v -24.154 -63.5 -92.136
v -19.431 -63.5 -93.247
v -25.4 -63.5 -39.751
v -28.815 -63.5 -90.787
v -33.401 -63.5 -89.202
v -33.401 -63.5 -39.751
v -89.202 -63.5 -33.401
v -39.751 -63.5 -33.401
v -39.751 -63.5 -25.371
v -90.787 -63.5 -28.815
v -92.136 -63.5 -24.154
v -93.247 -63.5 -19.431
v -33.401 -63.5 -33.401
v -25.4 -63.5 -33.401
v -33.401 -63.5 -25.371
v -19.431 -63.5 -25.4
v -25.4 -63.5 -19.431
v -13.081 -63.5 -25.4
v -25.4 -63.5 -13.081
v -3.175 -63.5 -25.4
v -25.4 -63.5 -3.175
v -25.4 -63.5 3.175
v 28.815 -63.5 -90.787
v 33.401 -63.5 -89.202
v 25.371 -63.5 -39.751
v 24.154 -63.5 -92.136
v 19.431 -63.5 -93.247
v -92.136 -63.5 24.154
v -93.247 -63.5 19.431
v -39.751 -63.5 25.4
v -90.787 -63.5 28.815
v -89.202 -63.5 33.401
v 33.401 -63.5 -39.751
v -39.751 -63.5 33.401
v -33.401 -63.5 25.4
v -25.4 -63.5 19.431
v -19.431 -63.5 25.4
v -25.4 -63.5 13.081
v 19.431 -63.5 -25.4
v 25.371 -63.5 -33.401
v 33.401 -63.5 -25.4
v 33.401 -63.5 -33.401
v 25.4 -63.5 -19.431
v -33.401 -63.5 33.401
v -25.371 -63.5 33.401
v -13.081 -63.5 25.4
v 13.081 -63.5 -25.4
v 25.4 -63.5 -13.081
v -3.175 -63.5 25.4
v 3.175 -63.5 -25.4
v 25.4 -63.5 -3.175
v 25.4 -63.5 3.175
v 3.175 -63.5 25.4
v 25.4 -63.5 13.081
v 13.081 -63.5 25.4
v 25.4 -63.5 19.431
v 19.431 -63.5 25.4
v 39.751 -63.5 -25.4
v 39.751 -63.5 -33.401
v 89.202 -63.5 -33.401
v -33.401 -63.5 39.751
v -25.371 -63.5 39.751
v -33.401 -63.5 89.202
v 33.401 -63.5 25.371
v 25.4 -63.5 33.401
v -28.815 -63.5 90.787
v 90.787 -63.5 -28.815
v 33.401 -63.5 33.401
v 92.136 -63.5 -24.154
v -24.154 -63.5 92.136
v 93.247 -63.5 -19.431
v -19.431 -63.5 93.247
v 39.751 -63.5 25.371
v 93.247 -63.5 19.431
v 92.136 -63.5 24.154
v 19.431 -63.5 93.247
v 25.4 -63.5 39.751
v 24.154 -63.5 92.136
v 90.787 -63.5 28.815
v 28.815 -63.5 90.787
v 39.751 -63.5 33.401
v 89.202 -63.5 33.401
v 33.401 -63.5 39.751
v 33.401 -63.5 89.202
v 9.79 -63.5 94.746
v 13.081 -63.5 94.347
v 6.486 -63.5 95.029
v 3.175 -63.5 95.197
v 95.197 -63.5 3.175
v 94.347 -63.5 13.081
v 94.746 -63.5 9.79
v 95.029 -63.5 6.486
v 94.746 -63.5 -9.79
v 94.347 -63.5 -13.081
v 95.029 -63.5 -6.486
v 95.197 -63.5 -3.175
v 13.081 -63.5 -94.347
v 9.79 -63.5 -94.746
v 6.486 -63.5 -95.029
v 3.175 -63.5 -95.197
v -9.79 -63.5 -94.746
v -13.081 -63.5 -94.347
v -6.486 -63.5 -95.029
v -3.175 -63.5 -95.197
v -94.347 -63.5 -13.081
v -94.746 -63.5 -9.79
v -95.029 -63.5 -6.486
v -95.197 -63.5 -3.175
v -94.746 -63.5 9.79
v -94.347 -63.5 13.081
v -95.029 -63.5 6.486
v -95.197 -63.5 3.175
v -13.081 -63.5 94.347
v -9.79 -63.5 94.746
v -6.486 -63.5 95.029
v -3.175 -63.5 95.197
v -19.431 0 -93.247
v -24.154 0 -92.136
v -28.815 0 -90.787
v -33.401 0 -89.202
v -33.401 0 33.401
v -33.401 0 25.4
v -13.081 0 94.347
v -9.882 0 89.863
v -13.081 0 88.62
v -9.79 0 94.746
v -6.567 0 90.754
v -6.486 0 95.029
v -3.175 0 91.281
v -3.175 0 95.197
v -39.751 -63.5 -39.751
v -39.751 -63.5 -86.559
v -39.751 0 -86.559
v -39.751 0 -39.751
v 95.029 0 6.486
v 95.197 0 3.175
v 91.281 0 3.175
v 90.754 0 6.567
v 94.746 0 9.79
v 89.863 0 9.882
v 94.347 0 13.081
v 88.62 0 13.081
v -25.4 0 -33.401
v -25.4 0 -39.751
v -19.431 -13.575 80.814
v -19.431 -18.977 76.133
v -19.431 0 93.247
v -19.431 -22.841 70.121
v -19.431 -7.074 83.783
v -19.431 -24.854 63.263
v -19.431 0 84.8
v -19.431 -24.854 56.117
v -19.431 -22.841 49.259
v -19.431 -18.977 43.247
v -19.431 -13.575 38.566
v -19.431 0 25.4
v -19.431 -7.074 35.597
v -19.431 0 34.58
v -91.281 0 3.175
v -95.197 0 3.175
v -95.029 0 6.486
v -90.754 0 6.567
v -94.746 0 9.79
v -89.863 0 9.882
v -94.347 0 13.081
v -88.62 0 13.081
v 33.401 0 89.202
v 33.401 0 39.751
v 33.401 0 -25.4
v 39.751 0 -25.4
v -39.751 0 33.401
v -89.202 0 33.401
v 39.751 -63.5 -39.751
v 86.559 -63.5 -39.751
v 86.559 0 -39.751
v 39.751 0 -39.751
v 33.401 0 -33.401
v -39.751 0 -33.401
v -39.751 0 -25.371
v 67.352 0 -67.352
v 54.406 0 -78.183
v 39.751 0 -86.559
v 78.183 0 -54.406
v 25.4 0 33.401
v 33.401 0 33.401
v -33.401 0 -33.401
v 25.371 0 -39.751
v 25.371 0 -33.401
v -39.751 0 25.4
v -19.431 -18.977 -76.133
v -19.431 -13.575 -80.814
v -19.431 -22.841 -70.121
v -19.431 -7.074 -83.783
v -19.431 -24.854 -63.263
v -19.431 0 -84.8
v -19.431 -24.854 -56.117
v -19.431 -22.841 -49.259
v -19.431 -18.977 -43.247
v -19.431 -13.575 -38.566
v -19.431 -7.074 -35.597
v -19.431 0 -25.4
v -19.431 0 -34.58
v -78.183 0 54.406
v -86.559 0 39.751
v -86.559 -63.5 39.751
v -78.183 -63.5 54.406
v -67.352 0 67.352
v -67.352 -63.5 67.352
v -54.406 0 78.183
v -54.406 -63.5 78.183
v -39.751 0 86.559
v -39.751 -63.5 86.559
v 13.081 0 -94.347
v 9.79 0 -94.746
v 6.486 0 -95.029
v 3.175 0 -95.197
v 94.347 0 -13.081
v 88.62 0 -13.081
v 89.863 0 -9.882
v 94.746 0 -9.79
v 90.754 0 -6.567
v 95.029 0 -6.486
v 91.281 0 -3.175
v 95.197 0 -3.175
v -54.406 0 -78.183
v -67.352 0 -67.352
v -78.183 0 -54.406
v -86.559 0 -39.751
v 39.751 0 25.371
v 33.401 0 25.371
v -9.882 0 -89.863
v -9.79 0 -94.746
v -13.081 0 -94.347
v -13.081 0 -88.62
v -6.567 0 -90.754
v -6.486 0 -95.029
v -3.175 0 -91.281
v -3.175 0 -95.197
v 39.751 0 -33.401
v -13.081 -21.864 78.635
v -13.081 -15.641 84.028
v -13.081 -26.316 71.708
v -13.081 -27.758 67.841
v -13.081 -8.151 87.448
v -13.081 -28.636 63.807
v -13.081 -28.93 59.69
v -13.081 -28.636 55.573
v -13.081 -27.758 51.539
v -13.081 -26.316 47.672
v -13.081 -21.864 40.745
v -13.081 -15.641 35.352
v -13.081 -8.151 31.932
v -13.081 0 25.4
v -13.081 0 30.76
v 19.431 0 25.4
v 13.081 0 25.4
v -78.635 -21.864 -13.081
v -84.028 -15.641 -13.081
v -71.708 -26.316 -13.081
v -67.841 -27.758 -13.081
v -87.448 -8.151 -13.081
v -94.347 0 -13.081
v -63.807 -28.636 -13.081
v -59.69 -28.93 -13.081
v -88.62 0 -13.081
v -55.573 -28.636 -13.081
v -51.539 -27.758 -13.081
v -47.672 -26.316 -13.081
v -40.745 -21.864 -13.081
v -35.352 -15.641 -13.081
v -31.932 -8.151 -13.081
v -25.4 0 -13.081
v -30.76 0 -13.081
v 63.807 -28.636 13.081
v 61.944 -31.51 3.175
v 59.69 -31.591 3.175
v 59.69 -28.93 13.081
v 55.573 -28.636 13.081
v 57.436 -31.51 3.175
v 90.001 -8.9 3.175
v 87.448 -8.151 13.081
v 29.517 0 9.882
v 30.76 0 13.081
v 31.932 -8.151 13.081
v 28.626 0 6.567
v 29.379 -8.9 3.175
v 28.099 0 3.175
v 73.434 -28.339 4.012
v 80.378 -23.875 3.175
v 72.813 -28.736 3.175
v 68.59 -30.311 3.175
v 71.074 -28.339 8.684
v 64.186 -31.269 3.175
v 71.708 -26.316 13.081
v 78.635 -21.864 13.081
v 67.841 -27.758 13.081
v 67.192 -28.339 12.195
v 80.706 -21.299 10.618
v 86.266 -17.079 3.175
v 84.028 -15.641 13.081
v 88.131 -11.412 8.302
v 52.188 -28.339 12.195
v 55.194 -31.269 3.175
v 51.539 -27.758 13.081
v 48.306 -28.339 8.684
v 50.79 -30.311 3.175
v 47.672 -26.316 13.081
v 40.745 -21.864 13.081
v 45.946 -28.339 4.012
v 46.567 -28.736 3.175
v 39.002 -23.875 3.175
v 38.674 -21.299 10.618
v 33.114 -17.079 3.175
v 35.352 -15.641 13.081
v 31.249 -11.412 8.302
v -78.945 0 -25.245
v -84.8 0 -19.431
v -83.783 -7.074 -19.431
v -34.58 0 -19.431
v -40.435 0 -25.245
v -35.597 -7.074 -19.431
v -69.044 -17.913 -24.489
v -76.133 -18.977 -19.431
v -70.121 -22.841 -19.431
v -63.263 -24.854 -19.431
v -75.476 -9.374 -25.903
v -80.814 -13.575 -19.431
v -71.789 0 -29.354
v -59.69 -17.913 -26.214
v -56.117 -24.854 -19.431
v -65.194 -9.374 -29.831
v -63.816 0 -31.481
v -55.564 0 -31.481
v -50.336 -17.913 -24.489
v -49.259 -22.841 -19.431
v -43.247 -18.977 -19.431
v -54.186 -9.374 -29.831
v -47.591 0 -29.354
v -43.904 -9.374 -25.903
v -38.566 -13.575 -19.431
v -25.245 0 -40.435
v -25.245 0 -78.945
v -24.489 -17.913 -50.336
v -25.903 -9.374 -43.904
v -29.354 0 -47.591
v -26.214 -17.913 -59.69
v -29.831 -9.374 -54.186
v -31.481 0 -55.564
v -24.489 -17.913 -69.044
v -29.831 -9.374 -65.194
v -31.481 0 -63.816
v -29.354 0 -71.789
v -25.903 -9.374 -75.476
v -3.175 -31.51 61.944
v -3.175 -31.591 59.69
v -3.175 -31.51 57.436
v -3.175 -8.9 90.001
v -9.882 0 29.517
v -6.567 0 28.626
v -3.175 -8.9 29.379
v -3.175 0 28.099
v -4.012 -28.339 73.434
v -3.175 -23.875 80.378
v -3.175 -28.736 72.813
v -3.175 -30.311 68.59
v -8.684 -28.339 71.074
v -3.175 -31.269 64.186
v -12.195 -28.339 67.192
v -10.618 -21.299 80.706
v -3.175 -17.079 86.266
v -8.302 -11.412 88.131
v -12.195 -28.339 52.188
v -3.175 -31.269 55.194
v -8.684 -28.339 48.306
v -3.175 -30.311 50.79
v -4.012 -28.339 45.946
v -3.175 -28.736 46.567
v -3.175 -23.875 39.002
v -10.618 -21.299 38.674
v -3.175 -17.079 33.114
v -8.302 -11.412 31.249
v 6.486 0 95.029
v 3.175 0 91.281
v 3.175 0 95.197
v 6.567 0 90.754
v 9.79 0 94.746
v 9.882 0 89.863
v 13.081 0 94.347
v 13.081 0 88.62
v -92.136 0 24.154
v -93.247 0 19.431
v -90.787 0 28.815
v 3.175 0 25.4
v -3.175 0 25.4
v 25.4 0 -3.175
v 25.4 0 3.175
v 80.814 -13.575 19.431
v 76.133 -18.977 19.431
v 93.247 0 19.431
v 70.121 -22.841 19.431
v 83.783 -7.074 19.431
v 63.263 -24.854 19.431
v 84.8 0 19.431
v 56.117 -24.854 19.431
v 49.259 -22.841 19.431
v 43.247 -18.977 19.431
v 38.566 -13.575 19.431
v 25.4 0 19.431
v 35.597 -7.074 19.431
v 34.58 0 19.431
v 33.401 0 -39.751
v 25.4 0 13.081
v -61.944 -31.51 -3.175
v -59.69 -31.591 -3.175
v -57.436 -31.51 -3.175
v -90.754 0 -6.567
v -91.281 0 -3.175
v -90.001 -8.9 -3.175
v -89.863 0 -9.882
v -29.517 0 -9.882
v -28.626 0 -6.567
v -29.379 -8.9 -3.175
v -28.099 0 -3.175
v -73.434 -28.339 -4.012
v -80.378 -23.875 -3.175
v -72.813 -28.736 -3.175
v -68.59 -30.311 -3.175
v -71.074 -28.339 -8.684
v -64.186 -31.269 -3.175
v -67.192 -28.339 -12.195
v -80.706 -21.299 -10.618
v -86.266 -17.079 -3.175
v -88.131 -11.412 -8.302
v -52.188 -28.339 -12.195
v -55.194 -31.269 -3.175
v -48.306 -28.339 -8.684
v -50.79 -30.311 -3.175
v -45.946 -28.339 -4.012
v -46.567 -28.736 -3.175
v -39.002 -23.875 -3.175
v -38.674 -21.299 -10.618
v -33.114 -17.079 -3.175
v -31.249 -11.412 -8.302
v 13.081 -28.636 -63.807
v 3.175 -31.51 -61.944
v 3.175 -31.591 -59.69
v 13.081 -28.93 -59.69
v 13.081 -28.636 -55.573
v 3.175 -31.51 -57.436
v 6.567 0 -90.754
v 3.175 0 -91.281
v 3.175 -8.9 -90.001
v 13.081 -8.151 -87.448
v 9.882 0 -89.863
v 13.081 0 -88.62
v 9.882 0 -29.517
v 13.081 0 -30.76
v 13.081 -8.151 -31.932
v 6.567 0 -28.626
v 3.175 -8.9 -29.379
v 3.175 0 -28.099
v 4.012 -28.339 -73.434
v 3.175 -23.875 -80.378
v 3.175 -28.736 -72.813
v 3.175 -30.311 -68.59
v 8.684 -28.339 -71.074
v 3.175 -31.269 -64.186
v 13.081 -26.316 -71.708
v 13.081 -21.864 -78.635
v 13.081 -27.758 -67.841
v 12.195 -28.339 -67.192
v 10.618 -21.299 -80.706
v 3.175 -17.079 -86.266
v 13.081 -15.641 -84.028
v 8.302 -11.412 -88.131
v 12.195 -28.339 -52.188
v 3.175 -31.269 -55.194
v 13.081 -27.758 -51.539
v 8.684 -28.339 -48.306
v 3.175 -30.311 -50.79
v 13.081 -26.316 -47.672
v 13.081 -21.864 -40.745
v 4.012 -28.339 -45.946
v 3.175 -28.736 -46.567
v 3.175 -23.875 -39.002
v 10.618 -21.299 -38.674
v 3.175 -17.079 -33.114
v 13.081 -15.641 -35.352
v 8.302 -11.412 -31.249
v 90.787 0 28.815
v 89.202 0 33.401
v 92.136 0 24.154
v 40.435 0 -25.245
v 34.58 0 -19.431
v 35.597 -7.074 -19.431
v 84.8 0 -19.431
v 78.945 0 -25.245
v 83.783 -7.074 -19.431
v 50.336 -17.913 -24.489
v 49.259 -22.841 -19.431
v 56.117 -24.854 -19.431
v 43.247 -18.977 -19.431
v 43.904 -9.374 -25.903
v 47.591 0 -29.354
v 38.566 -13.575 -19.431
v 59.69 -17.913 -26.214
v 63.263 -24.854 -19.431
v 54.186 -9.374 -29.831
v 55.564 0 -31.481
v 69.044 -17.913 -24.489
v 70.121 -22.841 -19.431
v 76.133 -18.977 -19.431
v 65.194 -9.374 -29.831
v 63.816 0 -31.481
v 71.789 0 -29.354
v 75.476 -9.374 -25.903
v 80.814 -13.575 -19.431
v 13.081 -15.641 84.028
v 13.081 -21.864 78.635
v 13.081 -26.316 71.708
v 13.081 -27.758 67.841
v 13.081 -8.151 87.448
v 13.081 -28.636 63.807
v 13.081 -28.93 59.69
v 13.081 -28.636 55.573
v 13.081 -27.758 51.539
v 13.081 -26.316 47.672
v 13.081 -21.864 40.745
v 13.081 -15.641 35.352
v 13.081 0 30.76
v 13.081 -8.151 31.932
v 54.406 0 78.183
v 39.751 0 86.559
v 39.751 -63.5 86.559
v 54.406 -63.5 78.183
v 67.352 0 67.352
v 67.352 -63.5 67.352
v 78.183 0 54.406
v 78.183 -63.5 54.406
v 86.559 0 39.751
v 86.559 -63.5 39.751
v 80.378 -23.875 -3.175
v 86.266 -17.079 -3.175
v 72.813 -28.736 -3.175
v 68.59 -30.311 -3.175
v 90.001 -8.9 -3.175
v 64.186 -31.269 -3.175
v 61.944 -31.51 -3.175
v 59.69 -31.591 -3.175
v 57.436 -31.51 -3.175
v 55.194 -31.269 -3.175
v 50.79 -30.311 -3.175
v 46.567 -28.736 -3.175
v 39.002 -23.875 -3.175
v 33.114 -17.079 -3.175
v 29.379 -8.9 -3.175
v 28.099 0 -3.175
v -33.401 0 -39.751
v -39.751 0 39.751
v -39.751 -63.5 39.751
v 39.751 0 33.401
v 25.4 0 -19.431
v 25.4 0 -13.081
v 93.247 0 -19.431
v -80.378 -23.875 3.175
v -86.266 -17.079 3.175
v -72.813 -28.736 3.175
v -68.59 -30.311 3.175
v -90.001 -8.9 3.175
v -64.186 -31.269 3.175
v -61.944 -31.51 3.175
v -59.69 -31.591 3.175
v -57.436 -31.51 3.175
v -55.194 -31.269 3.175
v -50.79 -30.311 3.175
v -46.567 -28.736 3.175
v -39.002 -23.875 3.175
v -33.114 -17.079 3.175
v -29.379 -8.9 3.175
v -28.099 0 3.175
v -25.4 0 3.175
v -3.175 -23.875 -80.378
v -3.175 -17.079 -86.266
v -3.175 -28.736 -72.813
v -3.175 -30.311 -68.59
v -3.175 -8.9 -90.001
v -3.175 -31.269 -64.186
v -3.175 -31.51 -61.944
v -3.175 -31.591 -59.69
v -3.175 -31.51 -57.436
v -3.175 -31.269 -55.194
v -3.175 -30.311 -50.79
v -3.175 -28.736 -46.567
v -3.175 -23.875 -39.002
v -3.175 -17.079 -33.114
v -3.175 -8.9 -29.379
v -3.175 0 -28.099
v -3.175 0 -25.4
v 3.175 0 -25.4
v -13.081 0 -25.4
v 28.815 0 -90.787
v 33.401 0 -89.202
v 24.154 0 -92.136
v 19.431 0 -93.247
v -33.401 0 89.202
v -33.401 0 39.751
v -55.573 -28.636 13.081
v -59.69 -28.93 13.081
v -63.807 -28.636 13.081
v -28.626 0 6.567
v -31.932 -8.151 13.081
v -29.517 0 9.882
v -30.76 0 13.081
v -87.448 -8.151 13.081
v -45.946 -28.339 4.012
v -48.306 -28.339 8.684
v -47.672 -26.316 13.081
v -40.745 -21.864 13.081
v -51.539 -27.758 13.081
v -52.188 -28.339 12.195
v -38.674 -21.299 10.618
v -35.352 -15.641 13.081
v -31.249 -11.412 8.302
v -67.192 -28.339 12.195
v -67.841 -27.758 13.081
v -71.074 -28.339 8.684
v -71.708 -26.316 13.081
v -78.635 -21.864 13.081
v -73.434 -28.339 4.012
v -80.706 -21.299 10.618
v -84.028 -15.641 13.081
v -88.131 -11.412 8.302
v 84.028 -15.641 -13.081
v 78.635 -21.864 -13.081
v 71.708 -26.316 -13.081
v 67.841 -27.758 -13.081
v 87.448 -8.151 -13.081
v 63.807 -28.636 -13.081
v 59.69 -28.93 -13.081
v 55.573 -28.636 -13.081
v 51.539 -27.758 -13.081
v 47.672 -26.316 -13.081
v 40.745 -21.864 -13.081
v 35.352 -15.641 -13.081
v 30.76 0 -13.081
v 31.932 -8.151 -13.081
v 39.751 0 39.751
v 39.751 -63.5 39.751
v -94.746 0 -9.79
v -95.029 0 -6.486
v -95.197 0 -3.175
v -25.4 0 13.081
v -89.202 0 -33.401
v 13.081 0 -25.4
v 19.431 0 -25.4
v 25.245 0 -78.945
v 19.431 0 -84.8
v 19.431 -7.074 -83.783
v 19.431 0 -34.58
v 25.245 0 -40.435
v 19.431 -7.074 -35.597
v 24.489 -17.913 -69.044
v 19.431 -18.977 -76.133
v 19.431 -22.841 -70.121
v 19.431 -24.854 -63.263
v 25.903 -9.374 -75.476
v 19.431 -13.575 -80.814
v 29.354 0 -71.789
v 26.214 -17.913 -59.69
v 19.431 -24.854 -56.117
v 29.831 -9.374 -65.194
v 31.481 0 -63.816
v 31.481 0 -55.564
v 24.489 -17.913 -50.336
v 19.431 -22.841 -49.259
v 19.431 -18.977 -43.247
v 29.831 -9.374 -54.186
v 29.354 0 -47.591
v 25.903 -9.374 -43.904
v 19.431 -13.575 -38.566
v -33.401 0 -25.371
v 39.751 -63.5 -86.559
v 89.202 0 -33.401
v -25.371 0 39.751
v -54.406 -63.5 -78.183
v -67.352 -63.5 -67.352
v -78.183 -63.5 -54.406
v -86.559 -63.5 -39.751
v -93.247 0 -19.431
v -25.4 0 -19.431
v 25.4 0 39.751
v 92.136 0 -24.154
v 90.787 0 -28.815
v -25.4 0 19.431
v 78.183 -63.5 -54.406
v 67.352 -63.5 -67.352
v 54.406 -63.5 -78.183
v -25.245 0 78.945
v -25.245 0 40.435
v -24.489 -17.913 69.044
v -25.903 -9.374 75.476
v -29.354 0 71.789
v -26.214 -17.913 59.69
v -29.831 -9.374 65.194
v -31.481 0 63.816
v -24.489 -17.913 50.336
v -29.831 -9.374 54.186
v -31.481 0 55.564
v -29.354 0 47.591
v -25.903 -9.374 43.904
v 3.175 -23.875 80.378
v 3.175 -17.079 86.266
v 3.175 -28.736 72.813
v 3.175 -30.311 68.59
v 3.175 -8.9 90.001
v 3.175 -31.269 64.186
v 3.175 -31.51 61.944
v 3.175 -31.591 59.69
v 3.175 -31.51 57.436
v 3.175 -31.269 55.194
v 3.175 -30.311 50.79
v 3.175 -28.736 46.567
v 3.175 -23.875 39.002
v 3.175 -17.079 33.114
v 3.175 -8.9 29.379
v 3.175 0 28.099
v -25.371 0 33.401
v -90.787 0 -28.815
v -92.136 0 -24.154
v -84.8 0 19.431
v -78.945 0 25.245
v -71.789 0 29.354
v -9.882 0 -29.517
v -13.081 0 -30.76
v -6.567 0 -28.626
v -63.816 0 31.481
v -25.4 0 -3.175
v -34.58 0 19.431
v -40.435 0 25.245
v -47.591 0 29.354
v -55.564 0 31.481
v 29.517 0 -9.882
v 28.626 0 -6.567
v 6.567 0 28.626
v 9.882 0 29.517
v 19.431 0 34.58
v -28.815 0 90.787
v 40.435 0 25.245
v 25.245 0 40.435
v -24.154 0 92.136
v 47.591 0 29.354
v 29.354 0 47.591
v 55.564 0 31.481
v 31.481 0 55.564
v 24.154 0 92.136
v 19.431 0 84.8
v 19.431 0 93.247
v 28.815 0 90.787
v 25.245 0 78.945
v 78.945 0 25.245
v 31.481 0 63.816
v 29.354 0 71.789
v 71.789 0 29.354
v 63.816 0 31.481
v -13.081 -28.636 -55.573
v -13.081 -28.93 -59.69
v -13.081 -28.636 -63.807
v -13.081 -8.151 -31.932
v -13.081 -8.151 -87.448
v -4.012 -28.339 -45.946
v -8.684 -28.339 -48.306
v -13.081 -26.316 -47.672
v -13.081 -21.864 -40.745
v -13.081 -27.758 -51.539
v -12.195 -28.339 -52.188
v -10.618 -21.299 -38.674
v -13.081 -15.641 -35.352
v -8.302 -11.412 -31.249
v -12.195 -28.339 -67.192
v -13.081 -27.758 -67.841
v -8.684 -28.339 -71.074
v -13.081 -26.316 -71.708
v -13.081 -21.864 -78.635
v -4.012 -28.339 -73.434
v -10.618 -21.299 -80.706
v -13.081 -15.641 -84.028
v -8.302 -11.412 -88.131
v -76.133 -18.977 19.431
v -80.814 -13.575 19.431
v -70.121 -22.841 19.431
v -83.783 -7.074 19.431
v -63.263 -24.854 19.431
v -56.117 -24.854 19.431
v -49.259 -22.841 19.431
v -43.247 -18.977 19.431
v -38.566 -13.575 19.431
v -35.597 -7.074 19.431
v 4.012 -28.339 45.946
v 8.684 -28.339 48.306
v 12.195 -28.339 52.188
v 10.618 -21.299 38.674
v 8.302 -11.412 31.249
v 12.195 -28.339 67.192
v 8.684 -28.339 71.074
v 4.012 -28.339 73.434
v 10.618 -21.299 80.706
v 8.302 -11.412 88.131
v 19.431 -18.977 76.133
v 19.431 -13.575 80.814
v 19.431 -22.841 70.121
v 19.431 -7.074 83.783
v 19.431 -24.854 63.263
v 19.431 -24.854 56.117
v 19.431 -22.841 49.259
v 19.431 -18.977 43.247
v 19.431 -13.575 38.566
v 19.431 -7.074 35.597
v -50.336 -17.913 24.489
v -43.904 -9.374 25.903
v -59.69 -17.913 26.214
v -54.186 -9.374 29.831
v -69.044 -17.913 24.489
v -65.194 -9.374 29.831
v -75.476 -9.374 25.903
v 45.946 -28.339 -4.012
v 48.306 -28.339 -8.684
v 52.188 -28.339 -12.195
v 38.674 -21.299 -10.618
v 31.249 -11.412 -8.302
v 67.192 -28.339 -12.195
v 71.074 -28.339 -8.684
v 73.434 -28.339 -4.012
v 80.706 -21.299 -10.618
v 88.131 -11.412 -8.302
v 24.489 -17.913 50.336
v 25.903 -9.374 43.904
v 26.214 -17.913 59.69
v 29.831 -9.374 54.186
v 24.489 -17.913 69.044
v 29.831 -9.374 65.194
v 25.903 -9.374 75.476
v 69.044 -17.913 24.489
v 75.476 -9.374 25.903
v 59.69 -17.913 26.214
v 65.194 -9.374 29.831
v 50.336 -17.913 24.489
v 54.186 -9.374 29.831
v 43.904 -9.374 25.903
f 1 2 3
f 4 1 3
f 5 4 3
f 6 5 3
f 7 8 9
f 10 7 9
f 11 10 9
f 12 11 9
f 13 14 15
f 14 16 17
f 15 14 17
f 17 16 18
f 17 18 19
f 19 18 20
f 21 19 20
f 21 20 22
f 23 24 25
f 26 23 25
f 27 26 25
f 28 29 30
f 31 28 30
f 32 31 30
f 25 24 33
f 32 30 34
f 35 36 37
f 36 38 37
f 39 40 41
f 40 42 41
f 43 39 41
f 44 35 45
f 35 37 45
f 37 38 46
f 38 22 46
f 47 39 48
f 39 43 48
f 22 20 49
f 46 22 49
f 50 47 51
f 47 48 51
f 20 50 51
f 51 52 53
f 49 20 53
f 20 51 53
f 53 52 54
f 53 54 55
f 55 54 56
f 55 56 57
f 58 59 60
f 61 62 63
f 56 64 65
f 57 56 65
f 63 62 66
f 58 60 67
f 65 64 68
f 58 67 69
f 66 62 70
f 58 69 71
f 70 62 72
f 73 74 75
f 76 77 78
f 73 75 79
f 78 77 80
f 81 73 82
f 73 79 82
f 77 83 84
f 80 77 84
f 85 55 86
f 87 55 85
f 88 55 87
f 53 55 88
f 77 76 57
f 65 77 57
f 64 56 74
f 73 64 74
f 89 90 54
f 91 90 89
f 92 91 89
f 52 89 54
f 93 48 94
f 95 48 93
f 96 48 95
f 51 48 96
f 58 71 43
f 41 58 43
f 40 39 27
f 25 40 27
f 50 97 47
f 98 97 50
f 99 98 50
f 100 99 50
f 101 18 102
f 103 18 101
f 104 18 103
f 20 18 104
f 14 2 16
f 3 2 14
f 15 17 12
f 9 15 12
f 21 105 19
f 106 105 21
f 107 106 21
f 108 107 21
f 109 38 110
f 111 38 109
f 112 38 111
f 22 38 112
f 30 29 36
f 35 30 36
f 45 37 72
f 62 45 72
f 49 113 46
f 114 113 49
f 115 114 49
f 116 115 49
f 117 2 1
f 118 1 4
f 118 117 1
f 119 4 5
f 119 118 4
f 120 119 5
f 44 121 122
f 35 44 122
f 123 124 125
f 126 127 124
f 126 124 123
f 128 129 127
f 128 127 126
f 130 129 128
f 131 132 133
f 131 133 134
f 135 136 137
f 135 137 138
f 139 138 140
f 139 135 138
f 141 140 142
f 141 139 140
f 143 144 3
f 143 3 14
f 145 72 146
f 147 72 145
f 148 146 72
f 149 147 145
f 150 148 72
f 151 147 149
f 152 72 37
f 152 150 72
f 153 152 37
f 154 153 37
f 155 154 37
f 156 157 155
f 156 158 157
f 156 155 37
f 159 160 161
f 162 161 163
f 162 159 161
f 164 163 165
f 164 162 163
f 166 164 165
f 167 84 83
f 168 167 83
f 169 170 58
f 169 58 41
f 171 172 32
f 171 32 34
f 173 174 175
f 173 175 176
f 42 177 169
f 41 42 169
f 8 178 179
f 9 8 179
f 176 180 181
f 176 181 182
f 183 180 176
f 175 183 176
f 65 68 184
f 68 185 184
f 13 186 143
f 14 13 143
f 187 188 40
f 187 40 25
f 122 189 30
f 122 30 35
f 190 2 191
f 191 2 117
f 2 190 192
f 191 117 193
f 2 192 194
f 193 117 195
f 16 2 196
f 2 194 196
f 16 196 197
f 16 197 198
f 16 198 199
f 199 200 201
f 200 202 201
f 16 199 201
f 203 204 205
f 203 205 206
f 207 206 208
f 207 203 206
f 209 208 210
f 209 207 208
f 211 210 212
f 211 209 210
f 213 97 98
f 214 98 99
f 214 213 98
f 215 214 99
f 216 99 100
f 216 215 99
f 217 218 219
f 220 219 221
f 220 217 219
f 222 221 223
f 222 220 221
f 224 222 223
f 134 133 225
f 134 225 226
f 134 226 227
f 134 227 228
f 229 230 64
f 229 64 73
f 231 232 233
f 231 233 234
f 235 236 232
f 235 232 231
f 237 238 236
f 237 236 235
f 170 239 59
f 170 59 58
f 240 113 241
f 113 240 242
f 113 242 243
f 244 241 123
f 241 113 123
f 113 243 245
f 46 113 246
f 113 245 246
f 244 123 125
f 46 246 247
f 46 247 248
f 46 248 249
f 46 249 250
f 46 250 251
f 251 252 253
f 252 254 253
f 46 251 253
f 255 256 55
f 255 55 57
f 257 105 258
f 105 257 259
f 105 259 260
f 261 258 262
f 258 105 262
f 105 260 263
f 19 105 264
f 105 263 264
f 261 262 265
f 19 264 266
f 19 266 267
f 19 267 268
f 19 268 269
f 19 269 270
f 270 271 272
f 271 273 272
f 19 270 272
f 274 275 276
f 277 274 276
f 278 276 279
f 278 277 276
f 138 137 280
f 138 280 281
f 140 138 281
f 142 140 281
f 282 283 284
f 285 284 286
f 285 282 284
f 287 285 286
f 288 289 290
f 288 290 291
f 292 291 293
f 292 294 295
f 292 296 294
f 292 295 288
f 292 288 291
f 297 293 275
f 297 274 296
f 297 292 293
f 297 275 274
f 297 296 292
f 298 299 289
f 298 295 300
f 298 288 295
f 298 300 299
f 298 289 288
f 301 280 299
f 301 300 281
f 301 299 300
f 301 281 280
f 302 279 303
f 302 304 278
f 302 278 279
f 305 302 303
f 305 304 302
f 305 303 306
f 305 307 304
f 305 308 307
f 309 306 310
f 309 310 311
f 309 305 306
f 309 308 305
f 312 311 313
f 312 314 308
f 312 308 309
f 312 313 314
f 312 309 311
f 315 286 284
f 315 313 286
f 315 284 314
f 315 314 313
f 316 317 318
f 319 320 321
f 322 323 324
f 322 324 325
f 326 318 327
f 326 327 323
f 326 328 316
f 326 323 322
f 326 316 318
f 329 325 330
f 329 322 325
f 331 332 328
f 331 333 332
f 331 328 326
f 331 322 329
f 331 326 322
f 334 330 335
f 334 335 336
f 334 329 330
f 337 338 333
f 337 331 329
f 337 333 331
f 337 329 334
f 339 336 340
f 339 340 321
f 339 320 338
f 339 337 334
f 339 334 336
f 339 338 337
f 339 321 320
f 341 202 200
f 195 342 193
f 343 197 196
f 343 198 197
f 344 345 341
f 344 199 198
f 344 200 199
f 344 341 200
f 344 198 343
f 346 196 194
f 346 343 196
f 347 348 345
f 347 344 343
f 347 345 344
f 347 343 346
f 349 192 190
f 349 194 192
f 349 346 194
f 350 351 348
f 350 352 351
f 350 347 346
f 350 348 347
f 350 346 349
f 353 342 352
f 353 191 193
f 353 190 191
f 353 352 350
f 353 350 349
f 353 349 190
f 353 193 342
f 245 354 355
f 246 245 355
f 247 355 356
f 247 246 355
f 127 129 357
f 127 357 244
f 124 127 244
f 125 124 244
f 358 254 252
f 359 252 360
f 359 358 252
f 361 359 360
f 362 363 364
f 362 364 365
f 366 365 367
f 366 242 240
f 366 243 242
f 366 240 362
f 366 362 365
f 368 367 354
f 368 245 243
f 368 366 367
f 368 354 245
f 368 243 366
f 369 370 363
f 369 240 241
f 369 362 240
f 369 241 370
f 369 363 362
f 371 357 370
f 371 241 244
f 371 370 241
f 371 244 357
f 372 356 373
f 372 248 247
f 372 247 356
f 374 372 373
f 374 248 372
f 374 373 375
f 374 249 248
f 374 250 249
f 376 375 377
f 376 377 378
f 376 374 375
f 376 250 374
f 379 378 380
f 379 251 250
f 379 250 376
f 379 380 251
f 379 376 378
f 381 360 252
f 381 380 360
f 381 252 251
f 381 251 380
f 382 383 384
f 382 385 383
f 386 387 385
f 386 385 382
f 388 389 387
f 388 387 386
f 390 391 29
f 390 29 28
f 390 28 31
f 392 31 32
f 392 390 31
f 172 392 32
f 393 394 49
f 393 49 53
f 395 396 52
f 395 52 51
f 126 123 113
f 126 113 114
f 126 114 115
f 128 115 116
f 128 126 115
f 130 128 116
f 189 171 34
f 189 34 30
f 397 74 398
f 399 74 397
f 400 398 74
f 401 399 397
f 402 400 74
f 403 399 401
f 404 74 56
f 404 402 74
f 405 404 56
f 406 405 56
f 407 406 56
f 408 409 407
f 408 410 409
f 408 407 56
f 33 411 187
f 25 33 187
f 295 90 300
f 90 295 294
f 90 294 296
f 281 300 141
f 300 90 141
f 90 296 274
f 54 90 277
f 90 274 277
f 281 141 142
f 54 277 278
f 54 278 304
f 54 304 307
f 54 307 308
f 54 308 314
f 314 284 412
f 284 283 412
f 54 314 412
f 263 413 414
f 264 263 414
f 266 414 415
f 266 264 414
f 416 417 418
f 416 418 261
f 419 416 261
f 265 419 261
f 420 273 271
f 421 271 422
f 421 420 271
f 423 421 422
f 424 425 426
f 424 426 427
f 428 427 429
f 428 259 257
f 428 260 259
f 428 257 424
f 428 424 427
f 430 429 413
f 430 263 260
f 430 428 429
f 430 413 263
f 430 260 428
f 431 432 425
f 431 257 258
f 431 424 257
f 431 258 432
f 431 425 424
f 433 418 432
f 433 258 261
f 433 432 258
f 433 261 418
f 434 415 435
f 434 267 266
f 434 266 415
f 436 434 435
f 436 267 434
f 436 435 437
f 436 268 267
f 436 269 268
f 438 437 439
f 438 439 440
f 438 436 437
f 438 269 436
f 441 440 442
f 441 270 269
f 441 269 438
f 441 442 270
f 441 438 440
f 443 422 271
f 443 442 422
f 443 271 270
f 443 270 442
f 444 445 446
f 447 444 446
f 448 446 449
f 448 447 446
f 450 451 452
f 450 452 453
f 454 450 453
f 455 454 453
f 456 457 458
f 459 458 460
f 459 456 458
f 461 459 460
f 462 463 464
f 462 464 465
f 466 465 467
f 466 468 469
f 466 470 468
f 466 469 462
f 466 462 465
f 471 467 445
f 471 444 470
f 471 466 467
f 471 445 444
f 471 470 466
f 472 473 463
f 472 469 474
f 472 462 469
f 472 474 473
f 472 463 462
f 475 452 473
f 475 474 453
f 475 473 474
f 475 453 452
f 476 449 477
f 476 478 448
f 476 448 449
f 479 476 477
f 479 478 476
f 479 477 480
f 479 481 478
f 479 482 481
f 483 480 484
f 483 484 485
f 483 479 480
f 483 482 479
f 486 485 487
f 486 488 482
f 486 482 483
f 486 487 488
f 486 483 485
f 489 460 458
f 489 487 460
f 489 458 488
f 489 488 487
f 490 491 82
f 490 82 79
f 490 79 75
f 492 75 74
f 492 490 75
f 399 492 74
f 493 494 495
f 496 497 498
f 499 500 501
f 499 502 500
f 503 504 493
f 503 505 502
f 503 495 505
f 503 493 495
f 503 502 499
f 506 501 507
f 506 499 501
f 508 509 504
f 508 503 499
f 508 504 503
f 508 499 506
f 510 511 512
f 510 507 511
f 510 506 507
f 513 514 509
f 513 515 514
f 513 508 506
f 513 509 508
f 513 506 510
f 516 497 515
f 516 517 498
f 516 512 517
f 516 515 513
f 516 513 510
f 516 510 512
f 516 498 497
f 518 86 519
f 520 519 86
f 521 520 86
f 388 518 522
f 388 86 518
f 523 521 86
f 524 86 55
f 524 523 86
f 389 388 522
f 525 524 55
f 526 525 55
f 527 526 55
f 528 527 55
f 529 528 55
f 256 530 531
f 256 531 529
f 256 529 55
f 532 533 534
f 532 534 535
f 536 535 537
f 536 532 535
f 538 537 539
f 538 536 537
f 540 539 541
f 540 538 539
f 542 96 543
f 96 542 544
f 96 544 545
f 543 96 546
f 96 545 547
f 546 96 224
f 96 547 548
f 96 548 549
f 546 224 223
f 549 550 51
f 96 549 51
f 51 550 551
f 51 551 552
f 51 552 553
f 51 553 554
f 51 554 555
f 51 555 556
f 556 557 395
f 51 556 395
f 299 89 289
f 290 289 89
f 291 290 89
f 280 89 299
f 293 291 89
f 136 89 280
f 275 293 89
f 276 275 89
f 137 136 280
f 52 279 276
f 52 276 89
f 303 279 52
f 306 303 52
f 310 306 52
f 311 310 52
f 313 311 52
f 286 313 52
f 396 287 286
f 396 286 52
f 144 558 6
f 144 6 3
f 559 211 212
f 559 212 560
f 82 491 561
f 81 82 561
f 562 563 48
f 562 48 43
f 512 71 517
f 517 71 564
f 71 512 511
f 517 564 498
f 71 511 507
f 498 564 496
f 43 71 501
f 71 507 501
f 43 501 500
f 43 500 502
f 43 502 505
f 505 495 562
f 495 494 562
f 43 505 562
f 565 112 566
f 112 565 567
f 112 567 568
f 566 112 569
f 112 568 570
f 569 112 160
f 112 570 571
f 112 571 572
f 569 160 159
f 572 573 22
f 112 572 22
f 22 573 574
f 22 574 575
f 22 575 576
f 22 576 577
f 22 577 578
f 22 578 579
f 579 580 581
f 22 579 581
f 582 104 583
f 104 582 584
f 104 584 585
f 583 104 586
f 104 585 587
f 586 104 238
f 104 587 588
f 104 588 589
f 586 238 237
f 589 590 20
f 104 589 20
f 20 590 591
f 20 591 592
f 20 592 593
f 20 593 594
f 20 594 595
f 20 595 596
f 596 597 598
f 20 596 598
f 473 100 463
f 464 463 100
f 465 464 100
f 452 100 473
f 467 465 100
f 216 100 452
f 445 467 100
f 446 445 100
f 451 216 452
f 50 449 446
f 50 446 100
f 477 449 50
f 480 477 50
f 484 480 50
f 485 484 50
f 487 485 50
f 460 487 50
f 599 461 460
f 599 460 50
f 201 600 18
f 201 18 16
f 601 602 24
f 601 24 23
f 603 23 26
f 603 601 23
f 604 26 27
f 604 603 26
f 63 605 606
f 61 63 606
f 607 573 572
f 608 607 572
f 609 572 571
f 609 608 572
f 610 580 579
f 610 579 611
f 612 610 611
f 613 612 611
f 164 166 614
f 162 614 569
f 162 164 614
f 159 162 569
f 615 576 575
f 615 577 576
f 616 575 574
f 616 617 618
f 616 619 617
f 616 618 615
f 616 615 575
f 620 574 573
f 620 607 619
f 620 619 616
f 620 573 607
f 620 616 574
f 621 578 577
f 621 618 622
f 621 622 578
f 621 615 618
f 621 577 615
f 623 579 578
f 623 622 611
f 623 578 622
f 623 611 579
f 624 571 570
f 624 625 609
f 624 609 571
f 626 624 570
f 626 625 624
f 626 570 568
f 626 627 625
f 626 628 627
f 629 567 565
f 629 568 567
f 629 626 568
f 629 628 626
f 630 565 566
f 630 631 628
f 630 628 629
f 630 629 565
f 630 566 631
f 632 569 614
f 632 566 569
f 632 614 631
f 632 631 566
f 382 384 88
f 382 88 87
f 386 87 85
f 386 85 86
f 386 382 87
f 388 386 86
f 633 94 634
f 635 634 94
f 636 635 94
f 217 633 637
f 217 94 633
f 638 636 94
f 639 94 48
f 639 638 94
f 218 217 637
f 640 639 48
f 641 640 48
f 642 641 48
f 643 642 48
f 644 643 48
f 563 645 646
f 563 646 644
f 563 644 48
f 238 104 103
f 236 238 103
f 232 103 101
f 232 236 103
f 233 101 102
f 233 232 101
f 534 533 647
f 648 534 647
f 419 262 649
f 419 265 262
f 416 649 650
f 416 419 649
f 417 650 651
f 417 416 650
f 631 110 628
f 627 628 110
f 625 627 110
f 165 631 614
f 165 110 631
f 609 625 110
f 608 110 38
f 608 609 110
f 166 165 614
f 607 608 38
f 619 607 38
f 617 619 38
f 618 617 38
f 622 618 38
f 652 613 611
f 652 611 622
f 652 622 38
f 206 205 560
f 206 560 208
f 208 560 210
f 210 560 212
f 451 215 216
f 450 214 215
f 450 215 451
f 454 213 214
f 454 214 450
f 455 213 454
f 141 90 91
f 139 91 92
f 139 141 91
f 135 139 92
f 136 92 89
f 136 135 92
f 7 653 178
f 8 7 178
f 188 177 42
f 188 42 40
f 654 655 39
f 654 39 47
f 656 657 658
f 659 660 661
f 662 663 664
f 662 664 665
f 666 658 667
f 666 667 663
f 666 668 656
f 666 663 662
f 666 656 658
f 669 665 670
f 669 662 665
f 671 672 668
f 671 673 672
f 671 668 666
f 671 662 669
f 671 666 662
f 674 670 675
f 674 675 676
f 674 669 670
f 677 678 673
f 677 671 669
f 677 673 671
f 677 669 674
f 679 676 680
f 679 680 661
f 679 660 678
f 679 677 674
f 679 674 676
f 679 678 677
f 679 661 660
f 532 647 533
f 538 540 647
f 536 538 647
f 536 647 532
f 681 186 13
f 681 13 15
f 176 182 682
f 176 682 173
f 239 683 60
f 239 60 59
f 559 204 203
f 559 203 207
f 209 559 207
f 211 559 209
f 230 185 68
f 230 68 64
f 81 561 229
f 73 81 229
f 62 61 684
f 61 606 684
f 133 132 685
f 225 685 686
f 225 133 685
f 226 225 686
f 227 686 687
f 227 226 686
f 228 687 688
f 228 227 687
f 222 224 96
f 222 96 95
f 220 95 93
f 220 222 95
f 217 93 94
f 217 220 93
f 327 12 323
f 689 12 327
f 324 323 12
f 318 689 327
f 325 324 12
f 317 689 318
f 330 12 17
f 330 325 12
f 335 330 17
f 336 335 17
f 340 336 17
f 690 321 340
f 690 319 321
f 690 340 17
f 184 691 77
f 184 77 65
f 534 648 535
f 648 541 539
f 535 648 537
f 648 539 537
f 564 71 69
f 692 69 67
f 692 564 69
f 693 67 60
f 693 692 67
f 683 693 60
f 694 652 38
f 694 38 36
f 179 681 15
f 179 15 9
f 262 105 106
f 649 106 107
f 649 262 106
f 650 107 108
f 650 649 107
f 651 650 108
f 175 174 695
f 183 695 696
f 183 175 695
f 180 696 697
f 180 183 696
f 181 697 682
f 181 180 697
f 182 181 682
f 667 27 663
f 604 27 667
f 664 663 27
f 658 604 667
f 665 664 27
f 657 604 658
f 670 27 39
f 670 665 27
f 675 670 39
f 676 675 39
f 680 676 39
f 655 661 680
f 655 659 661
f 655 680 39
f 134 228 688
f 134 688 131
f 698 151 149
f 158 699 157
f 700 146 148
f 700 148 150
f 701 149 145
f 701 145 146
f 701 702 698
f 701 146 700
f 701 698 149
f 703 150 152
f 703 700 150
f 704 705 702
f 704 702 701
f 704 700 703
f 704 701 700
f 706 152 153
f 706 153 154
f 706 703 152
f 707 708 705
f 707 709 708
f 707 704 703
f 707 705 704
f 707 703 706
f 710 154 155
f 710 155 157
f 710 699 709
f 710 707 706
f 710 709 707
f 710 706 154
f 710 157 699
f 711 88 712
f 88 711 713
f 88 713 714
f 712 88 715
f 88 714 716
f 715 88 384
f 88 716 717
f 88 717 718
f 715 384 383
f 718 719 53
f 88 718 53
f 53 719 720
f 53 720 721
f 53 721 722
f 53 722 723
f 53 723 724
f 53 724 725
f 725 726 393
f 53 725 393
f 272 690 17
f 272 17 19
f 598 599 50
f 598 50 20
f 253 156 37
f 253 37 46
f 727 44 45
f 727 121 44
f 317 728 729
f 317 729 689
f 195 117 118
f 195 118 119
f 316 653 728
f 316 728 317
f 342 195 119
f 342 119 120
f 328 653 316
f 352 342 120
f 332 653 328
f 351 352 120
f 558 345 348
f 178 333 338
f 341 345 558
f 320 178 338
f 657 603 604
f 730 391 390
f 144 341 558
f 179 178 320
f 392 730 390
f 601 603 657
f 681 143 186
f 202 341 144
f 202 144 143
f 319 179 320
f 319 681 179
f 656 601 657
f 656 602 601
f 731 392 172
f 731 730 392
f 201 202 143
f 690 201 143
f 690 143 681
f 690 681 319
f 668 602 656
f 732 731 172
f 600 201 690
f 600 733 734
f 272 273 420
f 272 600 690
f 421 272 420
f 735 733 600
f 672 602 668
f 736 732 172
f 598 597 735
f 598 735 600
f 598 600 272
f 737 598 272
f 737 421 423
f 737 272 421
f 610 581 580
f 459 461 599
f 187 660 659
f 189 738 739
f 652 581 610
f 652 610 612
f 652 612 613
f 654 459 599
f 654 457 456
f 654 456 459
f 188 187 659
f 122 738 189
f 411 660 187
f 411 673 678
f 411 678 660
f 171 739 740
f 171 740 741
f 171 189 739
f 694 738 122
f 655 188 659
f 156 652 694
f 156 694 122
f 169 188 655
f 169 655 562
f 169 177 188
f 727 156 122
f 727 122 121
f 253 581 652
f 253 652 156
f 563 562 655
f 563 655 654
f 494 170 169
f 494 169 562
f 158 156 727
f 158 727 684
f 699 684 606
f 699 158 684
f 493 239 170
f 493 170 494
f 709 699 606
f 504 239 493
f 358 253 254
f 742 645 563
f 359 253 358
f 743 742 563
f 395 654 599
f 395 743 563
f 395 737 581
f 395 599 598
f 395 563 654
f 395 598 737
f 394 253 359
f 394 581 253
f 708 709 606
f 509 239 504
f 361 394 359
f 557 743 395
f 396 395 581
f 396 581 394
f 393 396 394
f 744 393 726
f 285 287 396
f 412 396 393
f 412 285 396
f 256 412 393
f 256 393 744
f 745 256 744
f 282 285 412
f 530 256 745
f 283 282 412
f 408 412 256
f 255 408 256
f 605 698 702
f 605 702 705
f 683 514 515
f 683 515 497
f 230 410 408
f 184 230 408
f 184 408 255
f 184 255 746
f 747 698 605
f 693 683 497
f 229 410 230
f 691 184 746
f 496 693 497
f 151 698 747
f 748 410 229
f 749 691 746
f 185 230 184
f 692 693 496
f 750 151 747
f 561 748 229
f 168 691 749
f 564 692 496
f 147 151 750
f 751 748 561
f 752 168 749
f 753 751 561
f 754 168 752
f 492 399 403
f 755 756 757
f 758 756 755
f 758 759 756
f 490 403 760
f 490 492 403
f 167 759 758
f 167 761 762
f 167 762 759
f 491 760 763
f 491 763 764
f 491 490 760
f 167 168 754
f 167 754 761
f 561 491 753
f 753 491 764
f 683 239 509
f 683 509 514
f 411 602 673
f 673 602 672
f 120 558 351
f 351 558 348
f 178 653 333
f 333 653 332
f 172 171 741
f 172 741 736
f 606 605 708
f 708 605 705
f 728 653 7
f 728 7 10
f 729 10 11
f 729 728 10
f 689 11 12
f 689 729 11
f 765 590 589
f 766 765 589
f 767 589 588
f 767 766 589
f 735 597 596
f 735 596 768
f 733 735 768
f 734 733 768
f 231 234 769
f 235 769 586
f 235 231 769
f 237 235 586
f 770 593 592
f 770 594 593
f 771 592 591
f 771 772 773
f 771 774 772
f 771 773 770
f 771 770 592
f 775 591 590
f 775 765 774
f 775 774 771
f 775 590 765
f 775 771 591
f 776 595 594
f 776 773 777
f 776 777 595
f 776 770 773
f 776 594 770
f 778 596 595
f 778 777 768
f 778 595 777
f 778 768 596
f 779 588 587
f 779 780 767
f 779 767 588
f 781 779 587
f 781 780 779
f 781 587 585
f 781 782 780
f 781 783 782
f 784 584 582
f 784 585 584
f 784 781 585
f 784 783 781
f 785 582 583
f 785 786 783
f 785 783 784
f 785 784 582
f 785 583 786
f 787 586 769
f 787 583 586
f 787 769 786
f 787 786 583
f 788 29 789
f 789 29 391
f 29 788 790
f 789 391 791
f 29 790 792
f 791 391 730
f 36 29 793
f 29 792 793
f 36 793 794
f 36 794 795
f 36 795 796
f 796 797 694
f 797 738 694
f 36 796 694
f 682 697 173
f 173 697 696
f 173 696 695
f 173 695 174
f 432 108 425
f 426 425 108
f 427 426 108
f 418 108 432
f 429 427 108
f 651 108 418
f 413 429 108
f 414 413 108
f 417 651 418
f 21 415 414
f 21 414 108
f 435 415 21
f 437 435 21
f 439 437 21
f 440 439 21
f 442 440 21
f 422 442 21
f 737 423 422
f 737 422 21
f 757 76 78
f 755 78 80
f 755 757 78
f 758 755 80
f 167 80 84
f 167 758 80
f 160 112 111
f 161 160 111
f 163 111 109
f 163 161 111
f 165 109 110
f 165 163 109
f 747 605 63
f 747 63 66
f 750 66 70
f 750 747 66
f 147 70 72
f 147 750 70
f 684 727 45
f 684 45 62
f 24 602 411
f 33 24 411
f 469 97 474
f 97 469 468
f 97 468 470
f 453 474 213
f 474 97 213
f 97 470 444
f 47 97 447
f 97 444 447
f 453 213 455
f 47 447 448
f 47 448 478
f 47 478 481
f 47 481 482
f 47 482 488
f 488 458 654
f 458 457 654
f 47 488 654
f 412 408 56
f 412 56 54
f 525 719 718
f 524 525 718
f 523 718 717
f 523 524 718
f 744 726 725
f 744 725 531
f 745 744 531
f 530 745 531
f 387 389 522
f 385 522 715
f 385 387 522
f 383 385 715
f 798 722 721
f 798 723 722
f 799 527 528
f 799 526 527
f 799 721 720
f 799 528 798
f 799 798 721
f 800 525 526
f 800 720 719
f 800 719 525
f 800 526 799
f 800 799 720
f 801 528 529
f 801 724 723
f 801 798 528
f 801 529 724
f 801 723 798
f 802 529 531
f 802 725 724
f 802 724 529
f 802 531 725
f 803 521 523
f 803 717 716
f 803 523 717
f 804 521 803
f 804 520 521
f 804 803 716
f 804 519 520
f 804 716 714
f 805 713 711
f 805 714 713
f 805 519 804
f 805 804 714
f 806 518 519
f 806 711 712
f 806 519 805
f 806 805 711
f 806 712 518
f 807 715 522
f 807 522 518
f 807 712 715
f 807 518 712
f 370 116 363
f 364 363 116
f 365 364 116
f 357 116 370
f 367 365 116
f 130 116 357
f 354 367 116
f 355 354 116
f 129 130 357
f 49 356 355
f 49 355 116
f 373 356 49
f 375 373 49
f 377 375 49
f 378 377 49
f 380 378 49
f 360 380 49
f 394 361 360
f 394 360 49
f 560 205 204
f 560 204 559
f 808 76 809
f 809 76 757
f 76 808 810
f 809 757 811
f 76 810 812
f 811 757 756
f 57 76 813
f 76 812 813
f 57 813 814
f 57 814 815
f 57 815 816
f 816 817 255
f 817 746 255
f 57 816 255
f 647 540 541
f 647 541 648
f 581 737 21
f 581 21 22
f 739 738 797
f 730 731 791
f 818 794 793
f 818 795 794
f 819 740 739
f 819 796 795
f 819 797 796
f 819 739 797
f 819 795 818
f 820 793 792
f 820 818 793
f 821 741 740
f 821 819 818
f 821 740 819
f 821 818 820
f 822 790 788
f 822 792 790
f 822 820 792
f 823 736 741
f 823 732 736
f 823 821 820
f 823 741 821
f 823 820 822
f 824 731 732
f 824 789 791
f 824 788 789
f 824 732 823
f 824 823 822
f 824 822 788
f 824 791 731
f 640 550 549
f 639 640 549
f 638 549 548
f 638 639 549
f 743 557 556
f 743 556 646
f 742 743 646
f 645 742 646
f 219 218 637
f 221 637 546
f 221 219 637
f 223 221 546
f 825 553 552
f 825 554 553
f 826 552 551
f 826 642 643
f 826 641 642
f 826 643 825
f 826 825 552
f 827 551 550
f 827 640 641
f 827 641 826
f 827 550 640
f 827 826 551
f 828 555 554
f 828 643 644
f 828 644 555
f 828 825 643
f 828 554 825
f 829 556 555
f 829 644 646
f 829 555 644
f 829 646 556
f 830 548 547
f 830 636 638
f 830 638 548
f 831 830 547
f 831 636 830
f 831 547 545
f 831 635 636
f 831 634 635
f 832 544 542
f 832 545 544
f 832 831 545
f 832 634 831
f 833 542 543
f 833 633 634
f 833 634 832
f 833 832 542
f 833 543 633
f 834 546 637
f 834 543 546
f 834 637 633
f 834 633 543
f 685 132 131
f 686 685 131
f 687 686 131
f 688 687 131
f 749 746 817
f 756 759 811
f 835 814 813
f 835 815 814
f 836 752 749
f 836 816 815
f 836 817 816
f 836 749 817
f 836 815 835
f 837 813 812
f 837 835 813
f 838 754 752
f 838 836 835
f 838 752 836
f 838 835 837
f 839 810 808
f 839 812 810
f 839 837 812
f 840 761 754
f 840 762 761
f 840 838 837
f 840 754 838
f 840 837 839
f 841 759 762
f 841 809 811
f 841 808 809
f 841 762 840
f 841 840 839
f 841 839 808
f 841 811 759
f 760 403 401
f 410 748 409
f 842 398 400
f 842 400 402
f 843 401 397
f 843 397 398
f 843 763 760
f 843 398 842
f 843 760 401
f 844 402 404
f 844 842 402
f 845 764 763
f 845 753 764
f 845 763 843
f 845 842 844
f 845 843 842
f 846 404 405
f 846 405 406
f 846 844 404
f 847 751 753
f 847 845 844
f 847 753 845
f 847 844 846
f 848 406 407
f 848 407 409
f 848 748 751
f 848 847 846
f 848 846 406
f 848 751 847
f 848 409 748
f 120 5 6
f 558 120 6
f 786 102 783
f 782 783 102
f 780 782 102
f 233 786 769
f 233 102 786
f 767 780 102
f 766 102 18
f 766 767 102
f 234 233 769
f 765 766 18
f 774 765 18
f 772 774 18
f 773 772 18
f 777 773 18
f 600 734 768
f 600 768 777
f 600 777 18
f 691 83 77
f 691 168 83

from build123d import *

# Parameters (mm, degrees)
SKETCH1_R           = 95.25
BOSS_EXTRUDE1_DEPTH = 63.5
SKETCH7_W           = 6.35
SKETCH7_H           = 101.6
SKETCH7_H_2         = 100.875432805
CUT_EXTRUDE1_DEPTH  = 149.920700374
CIRPATTERN1_COUNT   = 4


with BuildPart() as part:
    # Sketch1 → Boss-Extrude1 (new body)
    with BuildSketch(Plane(origin=(0, 0, 0), x_dir=(1, 0, 0), z_dir=(0, 1, 0))):
        with Locations(Location((0, 0, 0), (0, 0, 270))):
            Circle(SKETCH1_R)
    extrude(amount=-BOSS_EXTRUDE1_DEPTH)

    # Sketch3 → Cut-Revolve3 (revolve, cut)
    with BuildSketch(Plane.XY.offset(59.69)):
        with BuildLine():
            Line((0, 0), (0, -31.75))
            ThreePointArc((0, -31.75), (22.450640303, -22.450640303), (31.75, 0))
            Line((31.75, 0), (0, 0))
        make_face()
    cut_revolve3 = revolve(axis=Axis((0, 0, 59.69), (0, -1, 0)), mode=Mode.SUBTRACT)

    # Sketch7 → Cut-Extrude1 (cut, through all)
    with BuildSketch(Plane(origin=(0, 0, 0), x_dir=(1, 0, 0), z_dir=(0, 1, 0))):
        with Locations((-16.256, -76.2)):
            Rectangle(SKETCH7_W, SKETCH7_H)
        with Locations((0, -76.2)):
            Rectangle(SKETCH7_W, SKETCH7_H)
        with Locations((16.256, -75.837716403)):
            Rectangle(SKETCH7_W, SKETCH7_H_2)
        with Locations((36.576, -76.171178844)):
            Rectangle(SKETCH7_W, SKETCH7_H)
        with Locations((-36.576, -76.2)):
            Rectangle(SKETCH7_W, SKETCH7_H)
    cut_extrude1 = extrude(amount=-CUT_EXTRUDE1_DEPTH, mode=Mode.SUBTRACT)

    # CirPattern1: Cut-Revolve3, Cut-Extrude1 ×4 about axis
    cirpattern1_axis = Axis((0, 0, 0), (0, 1, 0))
    add([cut_revolve3.rotate(cirpattern1_axis, i * 360 / CIRPATTERN1_COUNT) for i in range(1, CIRPATTERN1_COUNT)], mode=Mode.SUBTRACT)
    add([cut_extrude1.rotate(cirpattern1_axis, i * 360 / CIRPATTERN1_COUNT) for i in range(1, CIRPATTERN1_COUNT)], mode=Mode.SUBTRACT)


solid = part.part
